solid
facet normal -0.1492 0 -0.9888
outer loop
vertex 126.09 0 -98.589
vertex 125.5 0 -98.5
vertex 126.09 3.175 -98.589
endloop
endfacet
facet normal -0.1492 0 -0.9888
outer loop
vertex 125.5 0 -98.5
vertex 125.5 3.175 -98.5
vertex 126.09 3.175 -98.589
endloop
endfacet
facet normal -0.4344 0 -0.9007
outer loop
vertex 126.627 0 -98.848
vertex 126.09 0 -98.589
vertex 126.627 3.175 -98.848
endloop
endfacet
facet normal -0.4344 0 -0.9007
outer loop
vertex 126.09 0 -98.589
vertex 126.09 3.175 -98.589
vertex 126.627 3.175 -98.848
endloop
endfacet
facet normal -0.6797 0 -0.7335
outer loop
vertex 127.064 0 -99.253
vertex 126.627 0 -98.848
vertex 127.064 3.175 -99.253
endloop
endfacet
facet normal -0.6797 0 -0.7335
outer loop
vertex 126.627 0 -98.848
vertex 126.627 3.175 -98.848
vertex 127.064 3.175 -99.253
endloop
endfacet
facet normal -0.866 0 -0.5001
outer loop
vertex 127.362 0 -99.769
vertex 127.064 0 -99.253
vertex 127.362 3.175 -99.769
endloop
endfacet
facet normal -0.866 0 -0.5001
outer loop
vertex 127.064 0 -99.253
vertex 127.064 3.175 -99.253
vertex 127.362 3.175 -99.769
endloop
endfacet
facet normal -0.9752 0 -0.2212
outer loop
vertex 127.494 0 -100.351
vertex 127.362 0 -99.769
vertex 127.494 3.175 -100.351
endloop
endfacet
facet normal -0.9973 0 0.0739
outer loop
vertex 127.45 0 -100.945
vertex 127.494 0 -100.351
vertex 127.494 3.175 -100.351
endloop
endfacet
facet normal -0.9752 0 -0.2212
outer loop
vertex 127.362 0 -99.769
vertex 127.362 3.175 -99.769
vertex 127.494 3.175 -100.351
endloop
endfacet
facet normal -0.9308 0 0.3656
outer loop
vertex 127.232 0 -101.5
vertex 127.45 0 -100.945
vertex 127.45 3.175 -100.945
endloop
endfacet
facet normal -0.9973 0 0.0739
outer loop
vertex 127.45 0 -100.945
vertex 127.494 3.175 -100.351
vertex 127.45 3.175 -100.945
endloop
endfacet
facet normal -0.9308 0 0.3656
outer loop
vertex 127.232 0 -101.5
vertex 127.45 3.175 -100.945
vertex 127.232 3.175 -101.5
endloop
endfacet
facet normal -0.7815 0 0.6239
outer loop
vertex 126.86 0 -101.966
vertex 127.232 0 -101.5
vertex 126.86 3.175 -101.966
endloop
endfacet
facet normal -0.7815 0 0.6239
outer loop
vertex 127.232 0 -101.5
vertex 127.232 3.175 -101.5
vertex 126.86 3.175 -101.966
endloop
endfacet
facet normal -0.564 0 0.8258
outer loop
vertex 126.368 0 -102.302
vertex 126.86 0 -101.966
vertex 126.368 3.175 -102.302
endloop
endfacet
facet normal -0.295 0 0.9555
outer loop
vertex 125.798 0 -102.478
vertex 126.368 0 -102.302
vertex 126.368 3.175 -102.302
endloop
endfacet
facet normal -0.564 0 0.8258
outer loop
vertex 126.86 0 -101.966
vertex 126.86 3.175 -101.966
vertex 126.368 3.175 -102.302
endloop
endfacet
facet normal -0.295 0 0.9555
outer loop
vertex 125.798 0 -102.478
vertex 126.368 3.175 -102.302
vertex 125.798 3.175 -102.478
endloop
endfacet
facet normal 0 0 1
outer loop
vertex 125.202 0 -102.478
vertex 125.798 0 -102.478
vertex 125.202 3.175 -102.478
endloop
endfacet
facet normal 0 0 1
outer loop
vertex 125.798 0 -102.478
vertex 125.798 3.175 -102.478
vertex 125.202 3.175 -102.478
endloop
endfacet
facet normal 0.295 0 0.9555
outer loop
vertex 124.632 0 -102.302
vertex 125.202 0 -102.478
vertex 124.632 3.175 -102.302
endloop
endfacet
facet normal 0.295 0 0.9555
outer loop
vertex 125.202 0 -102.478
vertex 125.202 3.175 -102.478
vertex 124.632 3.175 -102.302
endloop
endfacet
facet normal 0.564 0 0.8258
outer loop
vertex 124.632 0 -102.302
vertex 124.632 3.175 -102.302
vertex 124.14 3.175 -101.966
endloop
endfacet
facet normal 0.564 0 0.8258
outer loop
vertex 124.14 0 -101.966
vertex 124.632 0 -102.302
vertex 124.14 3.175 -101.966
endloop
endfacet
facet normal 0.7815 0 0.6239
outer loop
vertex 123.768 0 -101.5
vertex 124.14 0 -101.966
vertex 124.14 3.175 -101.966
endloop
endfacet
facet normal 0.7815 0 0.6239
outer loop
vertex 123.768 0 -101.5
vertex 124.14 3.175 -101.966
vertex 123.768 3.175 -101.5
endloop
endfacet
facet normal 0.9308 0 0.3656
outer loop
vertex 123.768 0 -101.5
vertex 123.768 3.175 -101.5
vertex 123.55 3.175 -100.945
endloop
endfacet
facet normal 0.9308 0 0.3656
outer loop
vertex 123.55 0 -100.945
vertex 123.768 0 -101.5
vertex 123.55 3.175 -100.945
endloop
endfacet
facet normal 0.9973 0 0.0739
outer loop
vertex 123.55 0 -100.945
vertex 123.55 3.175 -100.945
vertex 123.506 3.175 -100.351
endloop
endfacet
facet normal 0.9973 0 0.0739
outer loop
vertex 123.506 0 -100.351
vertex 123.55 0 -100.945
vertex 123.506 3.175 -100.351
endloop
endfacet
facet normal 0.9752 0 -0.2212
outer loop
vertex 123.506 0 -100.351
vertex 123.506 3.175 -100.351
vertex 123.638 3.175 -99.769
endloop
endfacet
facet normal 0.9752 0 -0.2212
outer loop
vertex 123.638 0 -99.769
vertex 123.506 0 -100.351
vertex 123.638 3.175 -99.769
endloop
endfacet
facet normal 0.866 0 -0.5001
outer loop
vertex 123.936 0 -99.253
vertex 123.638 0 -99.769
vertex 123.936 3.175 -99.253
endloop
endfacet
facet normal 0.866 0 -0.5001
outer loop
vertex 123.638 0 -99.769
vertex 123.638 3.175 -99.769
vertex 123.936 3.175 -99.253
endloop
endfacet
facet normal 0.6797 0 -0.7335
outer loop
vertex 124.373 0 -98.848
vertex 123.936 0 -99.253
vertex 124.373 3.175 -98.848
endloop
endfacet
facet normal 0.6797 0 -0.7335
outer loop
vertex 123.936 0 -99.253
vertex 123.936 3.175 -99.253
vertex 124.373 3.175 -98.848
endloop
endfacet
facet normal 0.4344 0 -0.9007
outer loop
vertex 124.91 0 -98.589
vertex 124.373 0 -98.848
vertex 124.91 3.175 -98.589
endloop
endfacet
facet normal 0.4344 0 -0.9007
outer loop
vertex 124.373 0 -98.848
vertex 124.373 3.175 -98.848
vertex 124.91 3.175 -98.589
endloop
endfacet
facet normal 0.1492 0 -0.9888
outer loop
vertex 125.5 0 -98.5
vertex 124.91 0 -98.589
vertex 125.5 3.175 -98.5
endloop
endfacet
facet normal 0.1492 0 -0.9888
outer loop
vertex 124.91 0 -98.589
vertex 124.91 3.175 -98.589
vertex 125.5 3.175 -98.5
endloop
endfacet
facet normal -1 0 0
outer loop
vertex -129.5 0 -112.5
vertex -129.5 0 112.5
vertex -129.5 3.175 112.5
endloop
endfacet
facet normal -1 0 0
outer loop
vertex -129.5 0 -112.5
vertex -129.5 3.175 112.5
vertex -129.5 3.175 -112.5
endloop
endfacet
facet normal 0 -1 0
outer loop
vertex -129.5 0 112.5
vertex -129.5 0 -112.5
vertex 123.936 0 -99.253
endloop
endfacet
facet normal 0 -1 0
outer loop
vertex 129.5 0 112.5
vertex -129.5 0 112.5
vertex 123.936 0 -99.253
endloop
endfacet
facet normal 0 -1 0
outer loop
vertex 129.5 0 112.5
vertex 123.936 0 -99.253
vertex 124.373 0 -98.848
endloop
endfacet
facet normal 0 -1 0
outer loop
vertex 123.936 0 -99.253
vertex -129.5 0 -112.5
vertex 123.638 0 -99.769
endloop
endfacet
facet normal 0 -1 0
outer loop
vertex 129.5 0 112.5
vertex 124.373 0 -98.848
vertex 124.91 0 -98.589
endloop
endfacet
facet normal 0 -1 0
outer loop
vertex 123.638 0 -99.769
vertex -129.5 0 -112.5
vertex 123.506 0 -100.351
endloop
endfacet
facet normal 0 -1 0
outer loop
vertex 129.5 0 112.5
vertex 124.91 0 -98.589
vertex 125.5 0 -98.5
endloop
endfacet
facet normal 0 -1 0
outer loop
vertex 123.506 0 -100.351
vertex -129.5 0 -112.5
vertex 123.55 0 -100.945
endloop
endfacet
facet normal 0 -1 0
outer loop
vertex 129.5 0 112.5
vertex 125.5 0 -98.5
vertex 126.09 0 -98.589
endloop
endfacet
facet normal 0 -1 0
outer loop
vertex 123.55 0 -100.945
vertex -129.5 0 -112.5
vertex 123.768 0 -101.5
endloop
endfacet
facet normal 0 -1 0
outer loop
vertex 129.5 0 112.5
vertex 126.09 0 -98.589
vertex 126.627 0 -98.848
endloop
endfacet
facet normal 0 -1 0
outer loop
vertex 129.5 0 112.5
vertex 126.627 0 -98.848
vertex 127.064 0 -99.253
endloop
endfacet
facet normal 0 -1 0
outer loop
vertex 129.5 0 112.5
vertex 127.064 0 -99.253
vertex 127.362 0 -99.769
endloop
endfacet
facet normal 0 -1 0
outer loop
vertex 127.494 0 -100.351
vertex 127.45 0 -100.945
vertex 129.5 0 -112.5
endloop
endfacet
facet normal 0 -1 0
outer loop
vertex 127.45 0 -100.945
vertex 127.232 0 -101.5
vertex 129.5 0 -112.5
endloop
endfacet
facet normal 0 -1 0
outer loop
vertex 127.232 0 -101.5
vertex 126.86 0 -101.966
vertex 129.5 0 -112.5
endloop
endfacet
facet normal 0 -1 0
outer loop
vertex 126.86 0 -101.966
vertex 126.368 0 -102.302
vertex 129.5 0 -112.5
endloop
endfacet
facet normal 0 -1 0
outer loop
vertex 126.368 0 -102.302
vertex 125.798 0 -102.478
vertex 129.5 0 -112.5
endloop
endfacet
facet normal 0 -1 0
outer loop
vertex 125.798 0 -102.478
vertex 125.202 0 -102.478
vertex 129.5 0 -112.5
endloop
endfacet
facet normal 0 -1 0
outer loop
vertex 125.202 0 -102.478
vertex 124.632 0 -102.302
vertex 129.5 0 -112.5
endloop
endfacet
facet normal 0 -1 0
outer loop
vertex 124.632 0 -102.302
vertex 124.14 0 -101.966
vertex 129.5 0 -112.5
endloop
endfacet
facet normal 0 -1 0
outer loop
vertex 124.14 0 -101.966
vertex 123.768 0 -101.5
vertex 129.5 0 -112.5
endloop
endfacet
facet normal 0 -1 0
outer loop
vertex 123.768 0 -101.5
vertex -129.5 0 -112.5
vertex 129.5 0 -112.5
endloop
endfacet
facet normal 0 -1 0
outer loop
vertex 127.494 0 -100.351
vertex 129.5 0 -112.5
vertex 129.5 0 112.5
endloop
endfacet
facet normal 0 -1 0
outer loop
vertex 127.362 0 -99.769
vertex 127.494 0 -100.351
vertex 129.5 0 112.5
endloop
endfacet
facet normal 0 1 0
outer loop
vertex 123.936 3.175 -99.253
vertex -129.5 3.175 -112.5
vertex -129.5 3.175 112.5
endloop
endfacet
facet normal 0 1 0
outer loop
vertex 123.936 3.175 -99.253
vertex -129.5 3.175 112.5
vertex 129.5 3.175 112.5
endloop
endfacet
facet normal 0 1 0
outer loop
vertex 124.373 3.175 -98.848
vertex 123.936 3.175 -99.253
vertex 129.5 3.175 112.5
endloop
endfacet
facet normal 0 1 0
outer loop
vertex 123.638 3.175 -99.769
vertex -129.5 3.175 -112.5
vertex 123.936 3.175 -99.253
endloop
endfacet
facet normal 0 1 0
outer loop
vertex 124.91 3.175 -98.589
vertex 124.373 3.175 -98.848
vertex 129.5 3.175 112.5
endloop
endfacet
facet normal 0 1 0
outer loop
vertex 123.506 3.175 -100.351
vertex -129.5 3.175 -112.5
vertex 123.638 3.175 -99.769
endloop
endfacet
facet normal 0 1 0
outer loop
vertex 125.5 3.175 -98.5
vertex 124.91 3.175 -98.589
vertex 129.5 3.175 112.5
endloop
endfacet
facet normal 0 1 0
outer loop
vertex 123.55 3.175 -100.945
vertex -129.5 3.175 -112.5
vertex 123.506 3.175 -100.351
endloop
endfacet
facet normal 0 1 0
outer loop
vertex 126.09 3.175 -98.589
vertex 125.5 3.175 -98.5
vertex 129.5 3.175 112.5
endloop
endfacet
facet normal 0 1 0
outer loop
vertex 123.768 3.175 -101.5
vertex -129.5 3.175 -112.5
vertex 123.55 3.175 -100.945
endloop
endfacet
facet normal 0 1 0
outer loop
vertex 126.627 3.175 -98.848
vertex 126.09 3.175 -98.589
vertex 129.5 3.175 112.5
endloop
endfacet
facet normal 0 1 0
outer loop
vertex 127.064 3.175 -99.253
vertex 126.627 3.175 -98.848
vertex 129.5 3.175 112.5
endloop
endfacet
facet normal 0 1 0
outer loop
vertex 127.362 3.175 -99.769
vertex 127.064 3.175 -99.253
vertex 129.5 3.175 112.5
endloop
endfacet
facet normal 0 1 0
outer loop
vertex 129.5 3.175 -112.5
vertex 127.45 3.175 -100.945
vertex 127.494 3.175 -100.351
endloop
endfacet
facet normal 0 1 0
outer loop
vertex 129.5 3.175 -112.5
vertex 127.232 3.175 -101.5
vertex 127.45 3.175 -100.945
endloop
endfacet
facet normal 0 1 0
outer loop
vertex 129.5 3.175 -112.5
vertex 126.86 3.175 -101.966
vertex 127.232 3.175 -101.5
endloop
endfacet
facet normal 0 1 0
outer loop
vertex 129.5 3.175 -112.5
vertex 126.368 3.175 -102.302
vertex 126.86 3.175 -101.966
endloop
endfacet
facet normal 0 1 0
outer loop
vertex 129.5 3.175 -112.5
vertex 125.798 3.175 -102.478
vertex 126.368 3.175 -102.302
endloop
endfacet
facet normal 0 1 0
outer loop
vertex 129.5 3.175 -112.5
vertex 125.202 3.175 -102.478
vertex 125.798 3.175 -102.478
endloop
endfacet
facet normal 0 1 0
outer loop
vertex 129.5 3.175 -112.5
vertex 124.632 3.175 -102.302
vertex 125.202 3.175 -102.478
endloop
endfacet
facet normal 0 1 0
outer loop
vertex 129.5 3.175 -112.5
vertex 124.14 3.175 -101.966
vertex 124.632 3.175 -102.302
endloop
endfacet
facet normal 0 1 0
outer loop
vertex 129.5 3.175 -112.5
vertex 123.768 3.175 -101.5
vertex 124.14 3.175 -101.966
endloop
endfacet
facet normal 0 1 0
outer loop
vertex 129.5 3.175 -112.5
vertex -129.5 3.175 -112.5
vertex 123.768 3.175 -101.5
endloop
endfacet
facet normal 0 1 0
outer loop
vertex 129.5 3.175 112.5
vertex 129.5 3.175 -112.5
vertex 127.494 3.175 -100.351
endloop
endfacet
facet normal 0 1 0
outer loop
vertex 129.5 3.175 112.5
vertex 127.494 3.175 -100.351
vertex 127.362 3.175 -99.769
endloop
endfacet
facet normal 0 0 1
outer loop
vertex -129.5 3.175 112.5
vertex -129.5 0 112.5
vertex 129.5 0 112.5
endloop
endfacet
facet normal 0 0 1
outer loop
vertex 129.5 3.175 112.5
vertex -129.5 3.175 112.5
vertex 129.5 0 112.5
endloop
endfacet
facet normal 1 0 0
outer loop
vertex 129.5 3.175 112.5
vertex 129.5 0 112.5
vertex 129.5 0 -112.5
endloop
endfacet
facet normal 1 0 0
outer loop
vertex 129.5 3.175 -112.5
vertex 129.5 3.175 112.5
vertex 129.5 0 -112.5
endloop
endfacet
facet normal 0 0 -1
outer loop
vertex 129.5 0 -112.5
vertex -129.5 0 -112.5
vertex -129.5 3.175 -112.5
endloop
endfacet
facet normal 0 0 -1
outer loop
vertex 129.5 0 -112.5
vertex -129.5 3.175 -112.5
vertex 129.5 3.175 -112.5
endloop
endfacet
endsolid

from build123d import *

# Parameters (mm, degrees)
SKETCH1_W            = 259
SKETCH1_H            = 225
BOSS_EXTRUDE1_DEPTH  = 3.175
NEW_MOUNTING_HOLE_R  = 2
NEW_MOUNT_HOLE_DEPTH = 5


with BuildPart() as part:
    # Sketch1 → Boss-Extrude1 (new body)
    with BuildSketch(Plane(origin=(0, 0, 0), x_dir=(1, 0, 0), z_dir=(0, 1, 0))):
        Rectangle(SKETCH1_W, SKETCH1_H)
    extrude(amount=BOSS_EXTRUDE1_DEPTH)

    # New mounting hole → New mount hole (cut, symmetric)
    with BuildSketch(Plane(origin=(0, 3.175, 0), x_dir=(1, 0, 0), z_dir=(0, 1, 0))):
        with Locations(Location((125.5, 100.5, 0), (0, 0, 270))):
            Circle(NEW_MOUNTING_HOLE_R)
    extrude(amount=NEW_MOUNT_HOLE_DEPTH, both=True, mode=Mode.SUBTRACT)


solid = part.part
